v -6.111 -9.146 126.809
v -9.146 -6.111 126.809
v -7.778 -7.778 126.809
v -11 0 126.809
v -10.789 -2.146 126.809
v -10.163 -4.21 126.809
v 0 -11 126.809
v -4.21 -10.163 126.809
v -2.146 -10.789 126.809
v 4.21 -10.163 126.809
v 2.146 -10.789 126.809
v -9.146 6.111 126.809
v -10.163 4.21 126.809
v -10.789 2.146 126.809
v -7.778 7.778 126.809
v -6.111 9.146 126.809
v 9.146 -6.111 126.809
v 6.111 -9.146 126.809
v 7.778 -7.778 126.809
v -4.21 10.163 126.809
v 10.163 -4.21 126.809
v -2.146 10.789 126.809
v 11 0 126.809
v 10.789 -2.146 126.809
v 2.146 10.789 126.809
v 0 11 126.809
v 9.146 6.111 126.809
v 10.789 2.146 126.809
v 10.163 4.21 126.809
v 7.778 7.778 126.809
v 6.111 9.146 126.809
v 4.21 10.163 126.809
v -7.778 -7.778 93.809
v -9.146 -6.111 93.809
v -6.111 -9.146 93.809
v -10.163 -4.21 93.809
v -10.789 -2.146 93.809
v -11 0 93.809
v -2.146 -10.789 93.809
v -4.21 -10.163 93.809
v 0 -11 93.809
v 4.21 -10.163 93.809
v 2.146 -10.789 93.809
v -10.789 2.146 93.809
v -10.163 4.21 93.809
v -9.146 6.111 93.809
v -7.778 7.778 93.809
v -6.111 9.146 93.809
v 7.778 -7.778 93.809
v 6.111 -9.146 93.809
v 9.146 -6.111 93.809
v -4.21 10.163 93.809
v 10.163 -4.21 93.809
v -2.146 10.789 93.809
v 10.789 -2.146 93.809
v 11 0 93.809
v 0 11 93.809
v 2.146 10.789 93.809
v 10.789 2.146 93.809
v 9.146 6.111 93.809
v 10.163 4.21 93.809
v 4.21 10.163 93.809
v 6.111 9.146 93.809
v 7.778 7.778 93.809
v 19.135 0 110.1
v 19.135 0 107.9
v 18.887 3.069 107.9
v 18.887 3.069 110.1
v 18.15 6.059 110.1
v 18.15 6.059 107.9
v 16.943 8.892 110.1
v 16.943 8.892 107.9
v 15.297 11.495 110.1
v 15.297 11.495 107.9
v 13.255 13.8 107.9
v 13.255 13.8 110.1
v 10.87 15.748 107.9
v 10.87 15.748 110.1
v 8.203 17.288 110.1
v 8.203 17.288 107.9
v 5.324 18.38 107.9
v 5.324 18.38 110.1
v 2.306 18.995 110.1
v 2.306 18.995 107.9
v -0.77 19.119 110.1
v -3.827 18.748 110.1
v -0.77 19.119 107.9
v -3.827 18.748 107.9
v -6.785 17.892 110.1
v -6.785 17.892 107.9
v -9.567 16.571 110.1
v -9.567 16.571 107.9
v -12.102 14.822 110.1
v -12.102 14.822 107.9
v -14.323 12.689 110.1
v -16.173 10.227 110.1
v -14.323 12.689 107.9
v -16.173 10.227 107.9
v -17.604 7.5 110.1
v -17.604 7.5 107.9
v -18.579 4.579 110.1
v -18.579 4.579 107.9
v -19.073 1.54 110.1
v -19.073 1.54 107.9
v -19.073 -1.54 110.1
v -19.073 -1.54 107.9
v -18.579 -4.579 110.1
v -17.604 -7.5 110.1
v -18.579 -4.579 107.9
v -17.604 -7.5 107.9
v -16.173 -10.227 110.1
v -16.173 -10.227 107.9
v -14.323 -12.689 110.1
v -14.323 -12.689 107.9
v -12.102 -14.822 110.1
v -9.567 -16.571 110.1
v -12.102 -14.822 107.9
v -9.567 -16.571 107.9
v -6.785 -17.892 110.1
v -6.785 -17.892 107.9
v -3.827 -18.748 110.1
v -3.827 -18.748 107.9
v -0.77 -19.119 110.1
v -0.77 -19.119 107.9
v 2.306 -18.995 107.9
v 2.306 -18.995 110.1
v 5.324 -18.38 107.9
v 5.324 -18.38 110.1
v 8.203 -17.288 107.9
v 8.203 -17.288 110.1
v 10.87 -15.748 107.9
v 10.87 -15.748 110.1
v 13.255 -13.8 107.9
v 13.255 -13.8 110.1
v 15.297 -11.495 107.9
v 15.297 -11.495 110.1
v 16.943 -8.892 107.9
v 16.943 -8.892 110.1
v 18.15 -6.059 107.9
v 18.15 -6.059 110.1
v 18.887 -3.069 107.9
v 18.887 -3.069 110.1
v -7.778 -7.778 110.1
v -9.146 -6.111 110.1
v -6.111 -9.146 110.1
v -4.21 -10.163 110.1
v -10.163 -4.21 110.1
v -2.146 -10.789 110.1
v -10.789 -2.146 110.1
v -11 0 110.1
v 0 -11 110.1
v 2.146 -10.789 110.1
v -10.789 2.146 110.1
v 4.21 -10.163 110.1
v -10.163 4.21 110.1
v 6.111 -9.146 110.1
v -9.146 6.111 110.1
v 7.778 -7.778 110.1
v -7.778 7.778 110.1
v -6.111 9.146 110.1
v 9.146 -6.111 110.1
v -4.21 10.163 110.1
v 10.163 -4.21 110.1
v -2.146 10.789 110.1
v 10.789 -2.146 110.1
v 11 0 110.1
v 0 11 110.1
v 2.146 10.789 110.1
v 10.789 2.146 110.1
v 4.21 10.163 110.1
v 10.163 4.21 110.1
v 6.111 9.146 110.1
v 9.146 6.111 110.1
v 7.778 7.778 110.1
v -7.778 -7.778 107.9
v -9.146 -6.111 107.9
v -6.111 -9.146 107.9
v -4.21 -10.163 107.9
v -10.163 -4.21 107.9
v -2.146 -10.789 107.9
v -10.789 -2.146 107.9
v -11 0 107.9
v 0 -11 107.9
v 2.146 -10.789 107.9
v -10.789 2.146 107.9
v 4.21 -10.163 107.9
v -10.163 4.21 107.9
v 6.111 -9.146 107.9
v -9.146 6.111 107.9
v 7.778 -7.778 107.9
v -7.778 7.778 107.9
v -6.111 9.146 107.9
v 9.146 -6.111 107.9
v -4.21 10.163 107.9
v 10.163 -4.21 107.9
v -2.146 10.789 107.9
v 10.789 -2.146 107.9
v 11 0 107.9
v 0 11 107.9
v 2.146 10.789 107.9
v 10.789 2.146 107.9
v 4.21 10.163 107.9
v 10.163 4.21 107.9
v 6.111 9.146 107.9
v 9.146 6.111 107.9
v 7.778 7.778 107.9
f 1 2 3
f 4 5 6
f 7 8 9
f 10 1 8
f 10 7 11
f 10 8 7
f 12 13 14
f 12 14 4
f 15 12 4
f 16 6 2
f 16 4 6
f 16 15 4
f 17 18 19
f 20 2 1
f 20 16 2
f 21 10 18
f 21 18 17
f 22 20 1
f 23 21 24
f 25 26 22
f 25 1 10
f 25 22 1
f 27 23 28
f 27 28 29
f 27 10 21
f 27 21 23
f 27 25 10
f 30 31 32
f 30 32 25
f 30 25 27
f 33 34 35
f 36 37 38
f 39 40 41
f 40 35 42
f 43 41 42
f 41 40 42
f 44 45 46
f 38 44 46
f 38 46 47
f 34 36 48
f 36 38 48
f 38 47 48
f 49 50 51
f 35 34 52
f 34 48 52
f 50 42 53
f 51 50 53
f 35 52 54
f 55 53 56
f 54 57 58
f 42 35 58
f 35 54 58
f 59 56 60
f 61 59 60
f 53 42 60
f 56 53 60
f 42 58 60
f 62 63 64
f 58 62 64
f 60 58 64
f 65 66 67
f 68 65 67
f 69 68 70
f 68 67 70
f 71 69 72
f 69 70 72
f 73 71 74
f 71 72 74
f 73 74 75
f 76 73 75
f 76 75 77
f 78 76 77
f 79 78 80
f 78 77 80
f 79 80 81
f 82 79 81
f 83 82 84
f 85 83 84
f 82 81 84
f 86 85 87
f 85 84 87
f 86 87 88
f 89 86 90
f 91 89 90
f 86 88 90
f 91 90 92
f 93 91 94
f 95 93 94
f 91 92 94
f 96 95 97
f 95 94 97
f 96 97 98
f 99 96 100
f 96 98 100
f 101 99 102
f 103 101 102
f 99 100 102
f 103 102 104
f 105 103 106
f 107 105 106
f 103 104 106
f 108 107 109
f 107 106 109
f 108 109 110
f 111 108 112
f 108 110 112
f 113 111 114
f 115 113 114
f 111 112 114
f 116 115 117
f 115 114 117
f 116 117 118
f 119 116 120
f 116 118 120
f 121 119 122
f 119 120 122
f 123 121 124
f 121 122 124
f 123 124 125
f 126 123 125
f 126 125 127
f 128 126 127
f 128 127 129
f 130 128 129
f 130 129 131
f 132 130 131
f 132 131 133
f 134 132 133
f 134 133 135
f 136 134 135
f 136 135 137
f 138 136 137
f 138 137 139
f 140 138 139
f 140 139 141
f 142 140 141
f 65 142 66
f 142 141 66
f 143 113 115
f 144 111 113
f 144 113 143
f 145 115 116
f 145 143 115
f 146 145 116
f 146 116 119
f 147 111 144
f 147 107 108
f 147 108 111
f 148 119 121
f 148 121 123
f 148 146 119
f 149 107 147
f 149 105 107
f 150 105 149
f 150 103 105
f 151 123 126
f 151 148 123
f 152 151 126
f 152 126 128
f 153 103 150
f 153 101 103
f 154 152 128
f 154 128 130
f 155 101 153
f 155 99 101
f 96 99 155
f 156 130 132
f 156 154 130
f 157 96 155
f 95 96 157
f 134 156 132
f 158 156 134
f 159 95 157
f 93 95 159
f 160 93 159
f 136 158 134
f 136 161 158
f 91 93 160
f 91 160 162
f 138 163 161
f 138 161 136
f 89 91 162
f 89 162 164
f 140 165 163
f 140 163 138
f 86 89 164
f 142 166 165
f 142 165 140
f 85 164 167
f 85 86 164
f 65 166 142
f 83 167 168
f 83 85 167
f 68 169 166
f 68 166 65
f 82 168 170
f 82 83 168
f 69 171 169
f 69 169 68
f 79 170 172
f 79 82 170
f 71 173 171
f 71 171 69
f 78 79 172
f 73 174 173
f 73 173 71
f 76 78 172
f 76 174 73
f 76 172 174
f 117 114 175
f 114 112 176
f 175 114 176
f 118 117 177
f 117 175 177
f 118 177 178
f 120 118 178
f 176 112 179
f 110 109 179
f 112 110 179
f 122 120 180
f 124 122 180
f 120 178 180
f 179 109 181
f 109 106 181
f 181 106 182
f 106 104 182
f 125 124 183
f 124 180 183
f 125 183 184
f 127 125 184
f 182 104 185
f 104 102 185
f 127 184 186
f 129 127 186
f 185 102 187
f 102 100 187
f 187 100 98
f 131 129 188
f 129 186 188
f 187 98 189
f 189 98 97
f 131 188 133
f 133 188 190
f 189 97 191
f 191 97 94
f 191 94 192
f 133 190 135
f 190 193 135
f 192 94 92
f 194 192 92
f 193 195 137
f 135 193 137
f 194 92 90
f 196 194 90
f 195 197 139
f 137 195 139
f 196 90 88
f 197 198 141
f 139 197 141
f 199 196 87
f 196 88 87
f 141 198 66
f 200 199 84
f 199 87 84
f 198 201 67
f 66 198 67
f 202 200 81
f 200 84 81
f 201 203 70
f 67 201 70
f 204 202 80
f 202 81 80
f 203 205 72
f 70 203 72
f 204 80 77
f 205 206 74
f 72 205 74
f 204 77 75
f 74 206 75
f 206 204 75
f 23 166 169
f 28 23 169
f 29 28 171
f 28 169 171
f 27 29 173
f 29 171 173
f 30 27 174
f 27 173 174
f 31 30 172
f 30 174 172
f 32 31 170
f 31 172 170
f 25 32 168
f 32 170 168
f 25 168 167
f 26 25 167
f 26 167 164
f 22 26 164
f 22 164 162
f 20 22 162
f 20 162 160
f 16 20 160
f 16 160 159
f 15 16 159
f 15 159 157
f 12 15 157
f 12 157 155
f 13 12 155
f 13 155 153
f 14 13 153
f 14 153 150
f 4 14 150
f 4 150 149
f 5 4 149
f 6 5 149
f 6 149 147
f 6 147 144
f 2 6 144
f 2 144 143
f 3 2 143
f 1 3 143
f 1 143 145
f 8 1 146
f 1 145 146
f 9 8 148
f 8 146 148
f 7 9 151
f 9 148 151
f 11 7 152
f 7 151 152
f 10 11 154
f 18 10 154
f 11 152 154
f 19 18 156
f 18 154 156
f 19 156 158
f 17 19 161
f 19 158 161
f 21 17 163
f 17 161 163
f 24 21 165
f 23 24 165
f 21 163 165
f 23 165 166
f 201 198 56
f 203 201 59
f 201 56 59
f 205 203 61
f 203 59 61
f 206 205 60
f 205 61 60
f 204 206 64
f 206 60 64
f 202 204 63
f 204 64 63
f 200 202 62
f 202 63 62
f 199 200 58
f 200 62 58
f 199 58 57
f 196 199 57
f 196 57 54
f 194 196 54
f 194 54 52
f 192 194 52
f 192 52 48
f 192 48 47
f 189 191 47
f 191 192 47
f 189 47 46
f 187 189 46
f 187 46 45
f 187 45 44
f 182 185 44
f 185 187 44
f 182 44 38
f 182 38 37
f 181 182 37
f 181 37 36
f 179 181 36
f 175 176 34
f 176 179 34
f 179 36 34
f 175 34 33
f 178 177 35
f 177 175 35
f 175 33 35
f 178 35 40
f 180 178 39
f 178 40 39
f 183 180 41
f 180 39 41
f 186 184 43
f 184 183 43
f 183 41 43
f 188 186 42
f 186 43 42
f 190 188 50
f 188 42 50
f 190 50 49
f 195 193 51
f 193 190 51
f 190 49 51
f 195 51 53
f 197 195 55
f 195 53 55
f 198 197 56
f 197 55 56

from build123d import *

# Parameters (mm, degrees)
CIRCLE001_R          = 8.697725
EXTRUDE_DEPTH        = 1
CYLINDER_R           = 5
CYLINDER_DEPTH       = 15
CLONE013_SCALE_SCALE = 2.2


with BuildPart() as neckblock:
    # Circle001 → Extrude (new body)
    with BuildSketch(Plane.XY.offset(57.640399)):
        Circle(CIRCLE001_R)
    extrude(amount=EXTRUDE_DEPTH)


with BuildPart() as neckblock_1:
    # Extrude placement: moved
    add(neckblock.part.moved(Location((0, 0, -8.594981))))


with BuildPart() as neckwithblock001:
    # Cylinder → Cylinder (new body)
    with BuildSketch(Plane.XY.offset(42.640399)):
        Circle(CYLINDER_R)
    extrude(amount=CYLINDER_DEPTH)

    # Fusion002: union NeckBlock
    add(neckblock_1.part)


with BuildPart() as neckwithblock001_1:
    # Clone013 scale: moved
    add(neckwithblock001.part.scale(CLONE013_SCALE_SCALE))


solid = neckwithblock001_1.part
